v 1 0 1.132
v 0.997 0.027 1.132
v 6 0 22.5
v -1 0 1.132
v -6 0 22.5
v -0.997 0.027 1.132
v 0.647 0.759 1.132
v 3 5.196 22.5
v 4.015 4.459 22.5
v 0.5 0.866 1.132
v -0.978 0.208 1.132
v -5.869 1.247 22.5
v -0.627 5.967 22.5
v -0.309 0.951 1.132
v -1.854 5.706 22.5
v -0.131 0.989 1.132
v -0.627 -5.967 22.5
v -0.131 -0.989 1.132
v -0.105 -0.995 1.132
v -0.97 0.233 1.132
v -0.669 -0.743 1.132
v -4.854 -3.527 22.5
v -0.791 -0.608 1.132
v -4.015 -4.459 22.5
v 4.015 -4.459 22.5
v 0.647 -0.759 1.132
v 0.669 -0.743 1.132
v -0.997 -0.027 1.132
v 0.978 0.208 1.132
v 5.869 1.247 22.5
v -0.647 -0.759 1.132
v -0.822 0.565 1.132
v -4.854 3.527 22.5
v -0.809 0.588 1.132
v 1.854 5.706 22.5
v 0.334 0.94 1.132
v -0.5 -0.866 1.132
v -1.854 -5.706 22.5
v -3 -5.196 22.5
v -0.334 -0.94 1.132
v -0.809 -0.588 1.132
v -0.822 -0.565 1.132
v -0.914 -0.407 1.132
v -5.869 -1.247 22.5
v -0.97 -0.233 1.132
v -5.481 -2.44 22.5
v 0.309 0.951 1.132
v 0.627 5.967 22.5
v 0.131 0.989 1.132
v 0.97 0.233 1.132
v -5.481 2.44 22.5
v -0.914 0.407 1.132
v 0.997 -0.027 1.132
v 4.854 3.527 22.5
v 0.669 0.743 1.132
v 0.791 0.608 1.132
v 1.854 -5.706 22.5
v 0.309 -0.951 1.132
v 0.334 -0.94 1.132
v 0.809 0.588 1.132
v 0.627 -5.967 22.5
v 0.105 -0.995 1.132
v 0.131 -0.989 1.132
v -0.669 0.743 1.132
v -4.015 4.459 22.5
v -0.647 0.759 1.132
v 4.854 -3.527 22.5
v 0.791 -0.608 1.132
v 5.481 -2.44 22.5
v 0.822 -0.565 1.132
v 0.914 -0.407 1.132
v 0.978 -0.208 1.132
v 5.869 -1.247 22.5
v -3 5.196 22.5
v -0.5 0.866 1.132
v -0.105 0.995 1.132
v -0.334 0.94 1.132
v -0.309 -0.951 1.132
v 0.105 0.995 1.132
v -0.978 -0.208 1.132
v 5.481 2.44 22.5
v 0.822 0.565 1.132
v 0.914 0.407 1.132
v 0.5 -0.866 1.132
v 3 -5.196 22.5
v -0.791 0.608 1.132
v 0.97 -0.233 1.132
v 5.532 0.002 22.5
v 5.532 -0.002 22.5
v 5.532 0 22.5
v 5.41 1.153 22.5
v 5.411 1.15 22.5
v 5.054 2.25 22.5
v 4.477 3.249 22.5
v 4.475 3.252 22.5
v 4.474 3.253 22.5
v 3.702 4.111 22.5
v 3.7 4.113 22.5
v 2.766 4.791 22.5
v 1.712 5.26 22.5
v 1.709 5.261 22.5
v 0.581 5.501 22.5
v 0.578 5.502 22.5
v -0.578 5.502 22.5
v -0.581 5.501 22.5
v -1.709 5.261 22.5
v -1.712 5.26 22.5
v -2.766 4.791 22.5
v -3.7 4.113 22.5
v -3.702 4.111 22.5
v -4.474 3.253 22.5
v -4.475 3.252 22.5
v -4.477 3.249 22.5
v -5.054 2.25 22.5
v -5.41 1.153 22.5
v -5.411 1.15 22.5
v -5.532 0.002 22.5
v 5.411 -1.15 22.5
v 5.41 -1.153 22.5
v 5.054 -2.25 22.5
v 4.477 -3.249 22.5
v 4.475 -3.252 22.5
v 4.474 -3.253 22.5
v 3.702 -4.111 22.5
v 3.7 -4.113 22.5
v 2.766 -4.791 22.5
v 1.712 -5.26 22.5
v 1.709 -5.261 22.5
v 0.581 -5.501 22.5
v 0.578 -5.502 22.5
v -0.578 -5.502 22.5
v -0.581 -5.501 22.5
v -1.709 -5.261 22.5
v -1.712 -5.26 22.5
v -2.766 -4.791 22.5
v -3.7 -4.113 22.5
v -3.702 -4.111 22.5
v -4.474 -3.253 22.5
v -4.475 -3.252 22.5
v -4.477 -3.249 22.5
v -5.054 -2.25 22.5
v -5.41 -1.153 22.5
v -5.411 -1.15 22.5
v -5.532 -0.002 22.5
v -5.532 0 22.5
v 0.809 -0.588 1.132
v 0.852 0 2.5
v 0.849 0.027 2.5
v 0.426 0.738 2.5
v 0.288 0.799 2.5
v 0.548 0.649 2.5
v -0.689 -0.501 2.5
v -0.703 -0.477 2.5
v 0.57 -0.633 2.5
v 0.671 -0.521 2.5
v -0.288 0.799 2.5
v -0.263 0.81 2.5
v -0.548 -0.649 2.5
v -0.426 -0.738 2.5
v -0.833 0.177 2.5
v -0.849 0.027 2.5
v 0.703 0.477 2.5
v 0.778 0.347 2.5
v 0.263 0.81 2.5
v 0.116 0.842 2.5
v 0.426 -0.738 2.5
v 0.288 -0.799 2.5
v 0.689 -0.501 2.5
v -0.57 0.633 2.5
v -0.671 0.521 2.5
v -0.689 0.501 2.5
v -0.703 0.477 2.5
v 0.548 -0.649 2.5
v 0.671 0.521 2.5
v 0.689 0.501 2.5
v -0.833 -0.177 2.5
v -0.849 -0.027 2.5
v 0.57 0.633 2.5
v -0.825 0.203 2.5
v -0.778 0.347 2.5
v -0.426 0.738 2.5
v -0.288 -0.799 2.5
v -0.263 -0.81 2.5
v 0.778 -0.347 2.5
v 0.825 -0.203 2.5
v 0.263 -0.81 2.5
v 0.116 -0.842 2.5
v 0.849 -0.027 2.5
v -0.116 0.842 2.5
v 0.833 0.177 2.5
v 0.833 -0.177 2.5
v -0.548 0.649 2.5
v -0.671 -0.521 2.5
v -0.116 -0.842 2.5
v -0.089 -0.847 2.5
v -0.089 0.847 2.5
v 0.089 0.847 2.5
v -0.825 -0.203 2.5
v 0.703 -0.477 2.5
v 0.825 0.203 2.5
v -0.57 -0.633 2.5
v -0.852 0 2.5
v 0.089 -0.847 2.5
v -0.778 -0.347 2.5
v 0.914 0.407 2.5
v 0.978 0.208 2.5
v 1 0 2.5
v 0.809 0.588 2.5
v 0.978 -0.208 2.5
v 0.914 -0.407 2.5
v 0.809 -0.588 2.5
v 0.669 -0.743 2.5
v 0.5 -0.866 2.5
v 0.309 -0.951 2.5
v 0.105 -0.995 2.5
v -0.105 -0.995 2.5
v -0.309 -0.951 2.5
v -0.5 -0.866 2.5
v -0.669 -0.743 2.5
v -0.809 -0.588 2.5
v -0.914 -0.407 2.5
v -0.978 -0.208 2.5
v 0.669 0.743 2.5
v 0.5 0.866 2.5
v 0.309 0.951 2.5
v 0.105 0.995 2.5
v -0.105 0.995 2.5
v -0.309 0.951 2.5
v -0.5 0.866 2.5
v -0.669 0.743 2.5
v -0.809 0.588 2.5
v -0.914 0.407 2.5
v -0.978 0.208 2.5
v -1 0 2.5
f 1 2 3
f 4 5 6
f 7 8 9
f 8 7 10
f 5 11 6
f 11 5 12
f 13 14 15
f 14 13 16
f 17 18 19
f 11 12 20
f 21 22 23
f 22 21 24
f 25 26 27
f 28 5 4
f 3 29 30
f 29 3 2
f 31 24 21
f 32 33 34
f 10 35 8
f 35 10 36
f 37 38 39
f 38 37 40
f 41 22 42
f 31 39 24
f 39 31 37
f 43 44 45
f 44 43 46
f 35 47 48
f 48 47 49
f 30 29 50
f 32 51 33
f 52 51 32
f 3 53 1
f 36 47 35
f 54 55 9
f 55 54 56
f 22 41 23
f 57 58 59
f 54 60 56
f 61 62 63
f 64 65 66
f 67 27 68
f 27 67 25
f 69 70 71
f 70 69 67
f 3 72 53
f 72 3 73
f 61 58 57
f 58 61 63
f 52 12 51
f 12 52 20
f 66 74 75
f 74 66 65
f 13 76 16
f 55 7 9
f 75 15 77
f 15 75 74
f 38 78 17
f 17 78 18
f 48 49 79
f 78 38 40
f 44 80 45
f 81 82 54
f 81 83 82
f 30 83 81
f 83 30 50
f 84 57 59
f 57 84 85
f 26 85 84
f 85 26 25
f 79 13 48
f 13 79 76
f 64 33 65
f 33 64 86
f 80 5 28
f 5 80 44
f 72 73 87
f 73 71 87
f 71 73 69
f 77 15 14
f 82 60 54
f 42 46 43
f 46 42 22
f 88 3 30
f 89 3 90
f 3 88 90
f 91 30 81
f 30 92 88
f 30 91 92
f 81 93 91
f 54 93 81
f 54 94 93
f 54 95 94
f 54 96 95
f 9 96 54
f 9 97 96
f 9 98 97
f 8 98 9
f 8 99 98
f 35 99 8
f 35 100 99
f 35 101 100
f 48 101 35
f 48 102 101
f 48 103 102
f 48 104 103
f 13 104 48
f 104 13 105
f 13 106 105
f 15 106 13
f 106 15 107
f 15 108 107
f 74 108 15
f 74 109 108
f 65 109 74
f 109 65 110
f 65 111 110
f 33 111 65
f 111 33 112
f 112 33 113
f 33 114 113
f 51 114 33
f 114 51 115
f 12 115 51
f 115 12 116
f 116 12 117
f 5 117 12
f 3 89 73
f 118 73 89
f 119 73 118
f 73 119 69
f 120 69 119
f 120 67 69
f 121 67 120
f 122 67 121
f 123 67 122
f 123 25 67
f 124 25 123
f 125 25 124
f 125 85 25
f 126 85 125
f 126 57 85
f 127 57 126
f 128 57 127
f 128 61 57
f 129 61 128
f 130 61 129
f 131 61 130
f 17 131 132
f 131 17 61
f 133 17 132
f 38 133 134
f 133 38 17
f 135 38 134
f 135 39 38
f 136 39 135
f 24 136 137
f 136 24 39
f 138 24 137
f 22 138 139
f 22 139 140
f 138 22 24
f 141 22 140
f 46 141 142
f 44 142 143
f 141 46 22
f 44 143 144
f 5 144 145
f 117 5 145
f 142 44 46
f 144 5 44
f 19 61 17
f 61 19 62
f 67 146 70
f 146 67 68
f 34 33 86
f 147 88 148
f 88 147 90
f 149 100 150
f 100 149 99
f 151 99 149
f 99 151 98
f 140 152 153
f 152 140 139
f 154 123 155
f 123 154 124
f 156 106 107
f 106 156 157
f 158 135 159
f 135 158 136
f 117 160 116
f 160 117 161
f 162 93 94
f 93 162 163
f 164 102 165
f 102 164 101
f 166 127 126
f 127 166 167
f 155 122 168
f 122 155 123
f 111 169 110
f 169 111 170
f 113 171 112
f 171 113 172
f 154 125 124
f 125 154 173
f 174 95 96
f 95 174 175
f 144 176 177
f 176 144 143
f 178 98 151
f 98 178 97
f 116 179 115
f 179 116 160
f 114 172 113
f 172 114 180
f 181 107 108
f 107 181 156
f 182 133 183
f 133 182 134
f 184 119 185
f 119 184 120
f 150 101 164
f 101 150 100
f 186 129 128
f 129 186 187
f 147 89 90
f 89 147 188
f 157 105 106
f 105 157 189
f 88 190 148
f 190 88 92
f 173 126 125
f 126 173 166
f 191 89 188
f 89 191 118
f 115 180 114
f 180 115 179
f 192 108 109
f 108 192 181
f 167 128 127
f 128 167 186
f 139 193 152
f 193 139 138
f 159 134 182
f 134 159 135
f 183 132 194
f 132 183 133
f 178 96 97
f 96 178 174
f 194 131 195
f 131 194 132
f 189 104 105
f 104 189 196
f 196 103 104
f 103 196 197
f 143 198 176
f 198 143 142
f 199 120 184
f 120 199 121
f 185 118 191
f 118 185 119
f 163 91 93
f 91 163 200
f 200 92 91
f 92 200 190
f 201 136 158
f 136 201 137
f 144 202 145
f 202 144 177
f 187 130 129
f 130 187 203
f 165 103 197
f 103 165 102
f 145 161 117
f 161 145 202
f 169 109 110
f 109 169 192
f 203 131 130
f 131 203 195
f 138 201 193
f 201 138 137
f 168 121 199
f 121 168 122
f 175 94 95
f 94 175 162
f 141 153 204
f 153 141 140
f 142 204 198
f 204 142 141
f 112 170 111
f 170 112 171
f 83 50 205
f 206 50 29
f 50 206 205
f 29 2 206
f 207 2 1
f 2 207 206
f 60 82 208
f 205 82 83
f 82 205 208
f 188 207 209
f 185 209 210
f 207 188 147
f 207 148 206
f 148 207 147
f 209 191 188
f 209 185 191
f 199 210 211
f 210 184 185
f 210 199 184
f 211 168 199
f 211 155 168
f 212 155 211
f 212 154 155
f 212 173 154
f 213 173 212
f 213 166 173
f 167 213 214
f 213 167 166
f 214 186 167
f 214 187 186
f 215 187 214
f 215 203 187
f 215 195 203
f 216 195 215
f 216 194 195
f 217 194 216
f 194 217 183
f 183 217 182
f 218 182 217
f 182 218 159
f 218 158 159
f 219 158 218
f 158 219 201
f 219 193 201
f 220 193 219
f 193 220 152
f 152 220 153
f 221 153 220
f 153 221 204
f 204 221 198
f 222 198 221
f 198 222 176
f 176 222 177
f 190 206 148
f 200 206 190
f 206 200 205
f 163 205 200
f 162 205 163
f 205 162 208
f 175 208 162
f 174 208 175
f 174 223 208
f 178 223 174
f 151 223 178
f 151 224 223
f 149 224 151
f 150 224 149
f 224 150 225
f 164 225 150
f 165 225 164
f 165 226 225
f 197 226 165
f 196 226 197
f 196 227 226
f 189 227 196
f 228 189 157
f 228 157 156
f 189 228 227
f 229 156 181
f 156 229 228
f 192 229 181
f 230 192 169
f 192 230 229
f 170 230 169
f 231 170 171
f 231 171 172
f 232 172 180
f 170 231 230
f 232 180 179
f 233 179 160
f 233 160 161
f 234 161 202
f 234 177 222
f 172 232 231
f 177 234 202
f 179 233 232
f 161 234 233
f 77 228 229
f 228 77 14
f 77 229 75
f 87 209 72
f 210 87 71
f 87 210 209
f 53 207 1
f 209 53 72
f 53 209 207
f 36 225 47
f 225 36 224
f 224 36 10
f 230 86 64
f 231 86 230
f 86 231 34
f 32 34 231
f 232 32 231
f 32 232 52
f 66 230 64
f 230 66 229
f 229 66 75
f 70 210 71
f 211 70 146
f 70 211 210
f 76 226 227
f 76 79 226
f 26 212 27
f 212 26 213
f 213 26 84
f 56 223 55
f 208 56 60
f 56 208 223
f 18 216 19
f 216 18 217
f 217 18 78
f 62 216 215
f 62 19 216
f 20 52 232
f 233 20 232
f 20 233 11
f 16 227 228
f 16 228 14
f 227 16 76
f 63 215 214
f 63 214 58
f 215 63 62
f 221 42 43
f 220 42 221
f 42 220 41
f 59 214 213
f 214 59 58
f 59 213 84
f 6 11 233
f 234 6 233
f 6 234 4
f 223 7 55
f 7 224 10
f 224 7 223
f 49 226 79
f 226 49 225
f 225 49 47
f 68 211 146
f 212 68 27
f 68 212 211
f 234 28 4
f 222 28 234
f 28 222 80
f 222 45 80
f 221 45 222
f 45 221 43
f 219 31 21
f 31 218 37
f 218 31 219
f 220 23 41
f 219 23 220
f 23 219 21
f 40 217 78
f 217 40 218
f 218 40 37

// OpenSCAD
$fn = 30;

wall_diam         = 2;
kone_wd           = 0.15;
kone_ht           = 25;
wall_to_hole_coef = 3;
tube_len          = 5;

module tube() {
  cylinder(tube_len*2);
}

module kone() {
  difference() {
    cylinder(kone_ht, kone_wd,wall_diam * wall_to_hole_coef);
    translate([0,0,wall_diam]) cylinder(kone_ht, kone_wd,wall_diam * wall_to_hole_coef);
  }
}
module funnel() {
  translate([0,0,tube_len * -1.5]) difference() {
    translate([0,0,tube_len]) kone();
    tube();
  }
}

funnel();
